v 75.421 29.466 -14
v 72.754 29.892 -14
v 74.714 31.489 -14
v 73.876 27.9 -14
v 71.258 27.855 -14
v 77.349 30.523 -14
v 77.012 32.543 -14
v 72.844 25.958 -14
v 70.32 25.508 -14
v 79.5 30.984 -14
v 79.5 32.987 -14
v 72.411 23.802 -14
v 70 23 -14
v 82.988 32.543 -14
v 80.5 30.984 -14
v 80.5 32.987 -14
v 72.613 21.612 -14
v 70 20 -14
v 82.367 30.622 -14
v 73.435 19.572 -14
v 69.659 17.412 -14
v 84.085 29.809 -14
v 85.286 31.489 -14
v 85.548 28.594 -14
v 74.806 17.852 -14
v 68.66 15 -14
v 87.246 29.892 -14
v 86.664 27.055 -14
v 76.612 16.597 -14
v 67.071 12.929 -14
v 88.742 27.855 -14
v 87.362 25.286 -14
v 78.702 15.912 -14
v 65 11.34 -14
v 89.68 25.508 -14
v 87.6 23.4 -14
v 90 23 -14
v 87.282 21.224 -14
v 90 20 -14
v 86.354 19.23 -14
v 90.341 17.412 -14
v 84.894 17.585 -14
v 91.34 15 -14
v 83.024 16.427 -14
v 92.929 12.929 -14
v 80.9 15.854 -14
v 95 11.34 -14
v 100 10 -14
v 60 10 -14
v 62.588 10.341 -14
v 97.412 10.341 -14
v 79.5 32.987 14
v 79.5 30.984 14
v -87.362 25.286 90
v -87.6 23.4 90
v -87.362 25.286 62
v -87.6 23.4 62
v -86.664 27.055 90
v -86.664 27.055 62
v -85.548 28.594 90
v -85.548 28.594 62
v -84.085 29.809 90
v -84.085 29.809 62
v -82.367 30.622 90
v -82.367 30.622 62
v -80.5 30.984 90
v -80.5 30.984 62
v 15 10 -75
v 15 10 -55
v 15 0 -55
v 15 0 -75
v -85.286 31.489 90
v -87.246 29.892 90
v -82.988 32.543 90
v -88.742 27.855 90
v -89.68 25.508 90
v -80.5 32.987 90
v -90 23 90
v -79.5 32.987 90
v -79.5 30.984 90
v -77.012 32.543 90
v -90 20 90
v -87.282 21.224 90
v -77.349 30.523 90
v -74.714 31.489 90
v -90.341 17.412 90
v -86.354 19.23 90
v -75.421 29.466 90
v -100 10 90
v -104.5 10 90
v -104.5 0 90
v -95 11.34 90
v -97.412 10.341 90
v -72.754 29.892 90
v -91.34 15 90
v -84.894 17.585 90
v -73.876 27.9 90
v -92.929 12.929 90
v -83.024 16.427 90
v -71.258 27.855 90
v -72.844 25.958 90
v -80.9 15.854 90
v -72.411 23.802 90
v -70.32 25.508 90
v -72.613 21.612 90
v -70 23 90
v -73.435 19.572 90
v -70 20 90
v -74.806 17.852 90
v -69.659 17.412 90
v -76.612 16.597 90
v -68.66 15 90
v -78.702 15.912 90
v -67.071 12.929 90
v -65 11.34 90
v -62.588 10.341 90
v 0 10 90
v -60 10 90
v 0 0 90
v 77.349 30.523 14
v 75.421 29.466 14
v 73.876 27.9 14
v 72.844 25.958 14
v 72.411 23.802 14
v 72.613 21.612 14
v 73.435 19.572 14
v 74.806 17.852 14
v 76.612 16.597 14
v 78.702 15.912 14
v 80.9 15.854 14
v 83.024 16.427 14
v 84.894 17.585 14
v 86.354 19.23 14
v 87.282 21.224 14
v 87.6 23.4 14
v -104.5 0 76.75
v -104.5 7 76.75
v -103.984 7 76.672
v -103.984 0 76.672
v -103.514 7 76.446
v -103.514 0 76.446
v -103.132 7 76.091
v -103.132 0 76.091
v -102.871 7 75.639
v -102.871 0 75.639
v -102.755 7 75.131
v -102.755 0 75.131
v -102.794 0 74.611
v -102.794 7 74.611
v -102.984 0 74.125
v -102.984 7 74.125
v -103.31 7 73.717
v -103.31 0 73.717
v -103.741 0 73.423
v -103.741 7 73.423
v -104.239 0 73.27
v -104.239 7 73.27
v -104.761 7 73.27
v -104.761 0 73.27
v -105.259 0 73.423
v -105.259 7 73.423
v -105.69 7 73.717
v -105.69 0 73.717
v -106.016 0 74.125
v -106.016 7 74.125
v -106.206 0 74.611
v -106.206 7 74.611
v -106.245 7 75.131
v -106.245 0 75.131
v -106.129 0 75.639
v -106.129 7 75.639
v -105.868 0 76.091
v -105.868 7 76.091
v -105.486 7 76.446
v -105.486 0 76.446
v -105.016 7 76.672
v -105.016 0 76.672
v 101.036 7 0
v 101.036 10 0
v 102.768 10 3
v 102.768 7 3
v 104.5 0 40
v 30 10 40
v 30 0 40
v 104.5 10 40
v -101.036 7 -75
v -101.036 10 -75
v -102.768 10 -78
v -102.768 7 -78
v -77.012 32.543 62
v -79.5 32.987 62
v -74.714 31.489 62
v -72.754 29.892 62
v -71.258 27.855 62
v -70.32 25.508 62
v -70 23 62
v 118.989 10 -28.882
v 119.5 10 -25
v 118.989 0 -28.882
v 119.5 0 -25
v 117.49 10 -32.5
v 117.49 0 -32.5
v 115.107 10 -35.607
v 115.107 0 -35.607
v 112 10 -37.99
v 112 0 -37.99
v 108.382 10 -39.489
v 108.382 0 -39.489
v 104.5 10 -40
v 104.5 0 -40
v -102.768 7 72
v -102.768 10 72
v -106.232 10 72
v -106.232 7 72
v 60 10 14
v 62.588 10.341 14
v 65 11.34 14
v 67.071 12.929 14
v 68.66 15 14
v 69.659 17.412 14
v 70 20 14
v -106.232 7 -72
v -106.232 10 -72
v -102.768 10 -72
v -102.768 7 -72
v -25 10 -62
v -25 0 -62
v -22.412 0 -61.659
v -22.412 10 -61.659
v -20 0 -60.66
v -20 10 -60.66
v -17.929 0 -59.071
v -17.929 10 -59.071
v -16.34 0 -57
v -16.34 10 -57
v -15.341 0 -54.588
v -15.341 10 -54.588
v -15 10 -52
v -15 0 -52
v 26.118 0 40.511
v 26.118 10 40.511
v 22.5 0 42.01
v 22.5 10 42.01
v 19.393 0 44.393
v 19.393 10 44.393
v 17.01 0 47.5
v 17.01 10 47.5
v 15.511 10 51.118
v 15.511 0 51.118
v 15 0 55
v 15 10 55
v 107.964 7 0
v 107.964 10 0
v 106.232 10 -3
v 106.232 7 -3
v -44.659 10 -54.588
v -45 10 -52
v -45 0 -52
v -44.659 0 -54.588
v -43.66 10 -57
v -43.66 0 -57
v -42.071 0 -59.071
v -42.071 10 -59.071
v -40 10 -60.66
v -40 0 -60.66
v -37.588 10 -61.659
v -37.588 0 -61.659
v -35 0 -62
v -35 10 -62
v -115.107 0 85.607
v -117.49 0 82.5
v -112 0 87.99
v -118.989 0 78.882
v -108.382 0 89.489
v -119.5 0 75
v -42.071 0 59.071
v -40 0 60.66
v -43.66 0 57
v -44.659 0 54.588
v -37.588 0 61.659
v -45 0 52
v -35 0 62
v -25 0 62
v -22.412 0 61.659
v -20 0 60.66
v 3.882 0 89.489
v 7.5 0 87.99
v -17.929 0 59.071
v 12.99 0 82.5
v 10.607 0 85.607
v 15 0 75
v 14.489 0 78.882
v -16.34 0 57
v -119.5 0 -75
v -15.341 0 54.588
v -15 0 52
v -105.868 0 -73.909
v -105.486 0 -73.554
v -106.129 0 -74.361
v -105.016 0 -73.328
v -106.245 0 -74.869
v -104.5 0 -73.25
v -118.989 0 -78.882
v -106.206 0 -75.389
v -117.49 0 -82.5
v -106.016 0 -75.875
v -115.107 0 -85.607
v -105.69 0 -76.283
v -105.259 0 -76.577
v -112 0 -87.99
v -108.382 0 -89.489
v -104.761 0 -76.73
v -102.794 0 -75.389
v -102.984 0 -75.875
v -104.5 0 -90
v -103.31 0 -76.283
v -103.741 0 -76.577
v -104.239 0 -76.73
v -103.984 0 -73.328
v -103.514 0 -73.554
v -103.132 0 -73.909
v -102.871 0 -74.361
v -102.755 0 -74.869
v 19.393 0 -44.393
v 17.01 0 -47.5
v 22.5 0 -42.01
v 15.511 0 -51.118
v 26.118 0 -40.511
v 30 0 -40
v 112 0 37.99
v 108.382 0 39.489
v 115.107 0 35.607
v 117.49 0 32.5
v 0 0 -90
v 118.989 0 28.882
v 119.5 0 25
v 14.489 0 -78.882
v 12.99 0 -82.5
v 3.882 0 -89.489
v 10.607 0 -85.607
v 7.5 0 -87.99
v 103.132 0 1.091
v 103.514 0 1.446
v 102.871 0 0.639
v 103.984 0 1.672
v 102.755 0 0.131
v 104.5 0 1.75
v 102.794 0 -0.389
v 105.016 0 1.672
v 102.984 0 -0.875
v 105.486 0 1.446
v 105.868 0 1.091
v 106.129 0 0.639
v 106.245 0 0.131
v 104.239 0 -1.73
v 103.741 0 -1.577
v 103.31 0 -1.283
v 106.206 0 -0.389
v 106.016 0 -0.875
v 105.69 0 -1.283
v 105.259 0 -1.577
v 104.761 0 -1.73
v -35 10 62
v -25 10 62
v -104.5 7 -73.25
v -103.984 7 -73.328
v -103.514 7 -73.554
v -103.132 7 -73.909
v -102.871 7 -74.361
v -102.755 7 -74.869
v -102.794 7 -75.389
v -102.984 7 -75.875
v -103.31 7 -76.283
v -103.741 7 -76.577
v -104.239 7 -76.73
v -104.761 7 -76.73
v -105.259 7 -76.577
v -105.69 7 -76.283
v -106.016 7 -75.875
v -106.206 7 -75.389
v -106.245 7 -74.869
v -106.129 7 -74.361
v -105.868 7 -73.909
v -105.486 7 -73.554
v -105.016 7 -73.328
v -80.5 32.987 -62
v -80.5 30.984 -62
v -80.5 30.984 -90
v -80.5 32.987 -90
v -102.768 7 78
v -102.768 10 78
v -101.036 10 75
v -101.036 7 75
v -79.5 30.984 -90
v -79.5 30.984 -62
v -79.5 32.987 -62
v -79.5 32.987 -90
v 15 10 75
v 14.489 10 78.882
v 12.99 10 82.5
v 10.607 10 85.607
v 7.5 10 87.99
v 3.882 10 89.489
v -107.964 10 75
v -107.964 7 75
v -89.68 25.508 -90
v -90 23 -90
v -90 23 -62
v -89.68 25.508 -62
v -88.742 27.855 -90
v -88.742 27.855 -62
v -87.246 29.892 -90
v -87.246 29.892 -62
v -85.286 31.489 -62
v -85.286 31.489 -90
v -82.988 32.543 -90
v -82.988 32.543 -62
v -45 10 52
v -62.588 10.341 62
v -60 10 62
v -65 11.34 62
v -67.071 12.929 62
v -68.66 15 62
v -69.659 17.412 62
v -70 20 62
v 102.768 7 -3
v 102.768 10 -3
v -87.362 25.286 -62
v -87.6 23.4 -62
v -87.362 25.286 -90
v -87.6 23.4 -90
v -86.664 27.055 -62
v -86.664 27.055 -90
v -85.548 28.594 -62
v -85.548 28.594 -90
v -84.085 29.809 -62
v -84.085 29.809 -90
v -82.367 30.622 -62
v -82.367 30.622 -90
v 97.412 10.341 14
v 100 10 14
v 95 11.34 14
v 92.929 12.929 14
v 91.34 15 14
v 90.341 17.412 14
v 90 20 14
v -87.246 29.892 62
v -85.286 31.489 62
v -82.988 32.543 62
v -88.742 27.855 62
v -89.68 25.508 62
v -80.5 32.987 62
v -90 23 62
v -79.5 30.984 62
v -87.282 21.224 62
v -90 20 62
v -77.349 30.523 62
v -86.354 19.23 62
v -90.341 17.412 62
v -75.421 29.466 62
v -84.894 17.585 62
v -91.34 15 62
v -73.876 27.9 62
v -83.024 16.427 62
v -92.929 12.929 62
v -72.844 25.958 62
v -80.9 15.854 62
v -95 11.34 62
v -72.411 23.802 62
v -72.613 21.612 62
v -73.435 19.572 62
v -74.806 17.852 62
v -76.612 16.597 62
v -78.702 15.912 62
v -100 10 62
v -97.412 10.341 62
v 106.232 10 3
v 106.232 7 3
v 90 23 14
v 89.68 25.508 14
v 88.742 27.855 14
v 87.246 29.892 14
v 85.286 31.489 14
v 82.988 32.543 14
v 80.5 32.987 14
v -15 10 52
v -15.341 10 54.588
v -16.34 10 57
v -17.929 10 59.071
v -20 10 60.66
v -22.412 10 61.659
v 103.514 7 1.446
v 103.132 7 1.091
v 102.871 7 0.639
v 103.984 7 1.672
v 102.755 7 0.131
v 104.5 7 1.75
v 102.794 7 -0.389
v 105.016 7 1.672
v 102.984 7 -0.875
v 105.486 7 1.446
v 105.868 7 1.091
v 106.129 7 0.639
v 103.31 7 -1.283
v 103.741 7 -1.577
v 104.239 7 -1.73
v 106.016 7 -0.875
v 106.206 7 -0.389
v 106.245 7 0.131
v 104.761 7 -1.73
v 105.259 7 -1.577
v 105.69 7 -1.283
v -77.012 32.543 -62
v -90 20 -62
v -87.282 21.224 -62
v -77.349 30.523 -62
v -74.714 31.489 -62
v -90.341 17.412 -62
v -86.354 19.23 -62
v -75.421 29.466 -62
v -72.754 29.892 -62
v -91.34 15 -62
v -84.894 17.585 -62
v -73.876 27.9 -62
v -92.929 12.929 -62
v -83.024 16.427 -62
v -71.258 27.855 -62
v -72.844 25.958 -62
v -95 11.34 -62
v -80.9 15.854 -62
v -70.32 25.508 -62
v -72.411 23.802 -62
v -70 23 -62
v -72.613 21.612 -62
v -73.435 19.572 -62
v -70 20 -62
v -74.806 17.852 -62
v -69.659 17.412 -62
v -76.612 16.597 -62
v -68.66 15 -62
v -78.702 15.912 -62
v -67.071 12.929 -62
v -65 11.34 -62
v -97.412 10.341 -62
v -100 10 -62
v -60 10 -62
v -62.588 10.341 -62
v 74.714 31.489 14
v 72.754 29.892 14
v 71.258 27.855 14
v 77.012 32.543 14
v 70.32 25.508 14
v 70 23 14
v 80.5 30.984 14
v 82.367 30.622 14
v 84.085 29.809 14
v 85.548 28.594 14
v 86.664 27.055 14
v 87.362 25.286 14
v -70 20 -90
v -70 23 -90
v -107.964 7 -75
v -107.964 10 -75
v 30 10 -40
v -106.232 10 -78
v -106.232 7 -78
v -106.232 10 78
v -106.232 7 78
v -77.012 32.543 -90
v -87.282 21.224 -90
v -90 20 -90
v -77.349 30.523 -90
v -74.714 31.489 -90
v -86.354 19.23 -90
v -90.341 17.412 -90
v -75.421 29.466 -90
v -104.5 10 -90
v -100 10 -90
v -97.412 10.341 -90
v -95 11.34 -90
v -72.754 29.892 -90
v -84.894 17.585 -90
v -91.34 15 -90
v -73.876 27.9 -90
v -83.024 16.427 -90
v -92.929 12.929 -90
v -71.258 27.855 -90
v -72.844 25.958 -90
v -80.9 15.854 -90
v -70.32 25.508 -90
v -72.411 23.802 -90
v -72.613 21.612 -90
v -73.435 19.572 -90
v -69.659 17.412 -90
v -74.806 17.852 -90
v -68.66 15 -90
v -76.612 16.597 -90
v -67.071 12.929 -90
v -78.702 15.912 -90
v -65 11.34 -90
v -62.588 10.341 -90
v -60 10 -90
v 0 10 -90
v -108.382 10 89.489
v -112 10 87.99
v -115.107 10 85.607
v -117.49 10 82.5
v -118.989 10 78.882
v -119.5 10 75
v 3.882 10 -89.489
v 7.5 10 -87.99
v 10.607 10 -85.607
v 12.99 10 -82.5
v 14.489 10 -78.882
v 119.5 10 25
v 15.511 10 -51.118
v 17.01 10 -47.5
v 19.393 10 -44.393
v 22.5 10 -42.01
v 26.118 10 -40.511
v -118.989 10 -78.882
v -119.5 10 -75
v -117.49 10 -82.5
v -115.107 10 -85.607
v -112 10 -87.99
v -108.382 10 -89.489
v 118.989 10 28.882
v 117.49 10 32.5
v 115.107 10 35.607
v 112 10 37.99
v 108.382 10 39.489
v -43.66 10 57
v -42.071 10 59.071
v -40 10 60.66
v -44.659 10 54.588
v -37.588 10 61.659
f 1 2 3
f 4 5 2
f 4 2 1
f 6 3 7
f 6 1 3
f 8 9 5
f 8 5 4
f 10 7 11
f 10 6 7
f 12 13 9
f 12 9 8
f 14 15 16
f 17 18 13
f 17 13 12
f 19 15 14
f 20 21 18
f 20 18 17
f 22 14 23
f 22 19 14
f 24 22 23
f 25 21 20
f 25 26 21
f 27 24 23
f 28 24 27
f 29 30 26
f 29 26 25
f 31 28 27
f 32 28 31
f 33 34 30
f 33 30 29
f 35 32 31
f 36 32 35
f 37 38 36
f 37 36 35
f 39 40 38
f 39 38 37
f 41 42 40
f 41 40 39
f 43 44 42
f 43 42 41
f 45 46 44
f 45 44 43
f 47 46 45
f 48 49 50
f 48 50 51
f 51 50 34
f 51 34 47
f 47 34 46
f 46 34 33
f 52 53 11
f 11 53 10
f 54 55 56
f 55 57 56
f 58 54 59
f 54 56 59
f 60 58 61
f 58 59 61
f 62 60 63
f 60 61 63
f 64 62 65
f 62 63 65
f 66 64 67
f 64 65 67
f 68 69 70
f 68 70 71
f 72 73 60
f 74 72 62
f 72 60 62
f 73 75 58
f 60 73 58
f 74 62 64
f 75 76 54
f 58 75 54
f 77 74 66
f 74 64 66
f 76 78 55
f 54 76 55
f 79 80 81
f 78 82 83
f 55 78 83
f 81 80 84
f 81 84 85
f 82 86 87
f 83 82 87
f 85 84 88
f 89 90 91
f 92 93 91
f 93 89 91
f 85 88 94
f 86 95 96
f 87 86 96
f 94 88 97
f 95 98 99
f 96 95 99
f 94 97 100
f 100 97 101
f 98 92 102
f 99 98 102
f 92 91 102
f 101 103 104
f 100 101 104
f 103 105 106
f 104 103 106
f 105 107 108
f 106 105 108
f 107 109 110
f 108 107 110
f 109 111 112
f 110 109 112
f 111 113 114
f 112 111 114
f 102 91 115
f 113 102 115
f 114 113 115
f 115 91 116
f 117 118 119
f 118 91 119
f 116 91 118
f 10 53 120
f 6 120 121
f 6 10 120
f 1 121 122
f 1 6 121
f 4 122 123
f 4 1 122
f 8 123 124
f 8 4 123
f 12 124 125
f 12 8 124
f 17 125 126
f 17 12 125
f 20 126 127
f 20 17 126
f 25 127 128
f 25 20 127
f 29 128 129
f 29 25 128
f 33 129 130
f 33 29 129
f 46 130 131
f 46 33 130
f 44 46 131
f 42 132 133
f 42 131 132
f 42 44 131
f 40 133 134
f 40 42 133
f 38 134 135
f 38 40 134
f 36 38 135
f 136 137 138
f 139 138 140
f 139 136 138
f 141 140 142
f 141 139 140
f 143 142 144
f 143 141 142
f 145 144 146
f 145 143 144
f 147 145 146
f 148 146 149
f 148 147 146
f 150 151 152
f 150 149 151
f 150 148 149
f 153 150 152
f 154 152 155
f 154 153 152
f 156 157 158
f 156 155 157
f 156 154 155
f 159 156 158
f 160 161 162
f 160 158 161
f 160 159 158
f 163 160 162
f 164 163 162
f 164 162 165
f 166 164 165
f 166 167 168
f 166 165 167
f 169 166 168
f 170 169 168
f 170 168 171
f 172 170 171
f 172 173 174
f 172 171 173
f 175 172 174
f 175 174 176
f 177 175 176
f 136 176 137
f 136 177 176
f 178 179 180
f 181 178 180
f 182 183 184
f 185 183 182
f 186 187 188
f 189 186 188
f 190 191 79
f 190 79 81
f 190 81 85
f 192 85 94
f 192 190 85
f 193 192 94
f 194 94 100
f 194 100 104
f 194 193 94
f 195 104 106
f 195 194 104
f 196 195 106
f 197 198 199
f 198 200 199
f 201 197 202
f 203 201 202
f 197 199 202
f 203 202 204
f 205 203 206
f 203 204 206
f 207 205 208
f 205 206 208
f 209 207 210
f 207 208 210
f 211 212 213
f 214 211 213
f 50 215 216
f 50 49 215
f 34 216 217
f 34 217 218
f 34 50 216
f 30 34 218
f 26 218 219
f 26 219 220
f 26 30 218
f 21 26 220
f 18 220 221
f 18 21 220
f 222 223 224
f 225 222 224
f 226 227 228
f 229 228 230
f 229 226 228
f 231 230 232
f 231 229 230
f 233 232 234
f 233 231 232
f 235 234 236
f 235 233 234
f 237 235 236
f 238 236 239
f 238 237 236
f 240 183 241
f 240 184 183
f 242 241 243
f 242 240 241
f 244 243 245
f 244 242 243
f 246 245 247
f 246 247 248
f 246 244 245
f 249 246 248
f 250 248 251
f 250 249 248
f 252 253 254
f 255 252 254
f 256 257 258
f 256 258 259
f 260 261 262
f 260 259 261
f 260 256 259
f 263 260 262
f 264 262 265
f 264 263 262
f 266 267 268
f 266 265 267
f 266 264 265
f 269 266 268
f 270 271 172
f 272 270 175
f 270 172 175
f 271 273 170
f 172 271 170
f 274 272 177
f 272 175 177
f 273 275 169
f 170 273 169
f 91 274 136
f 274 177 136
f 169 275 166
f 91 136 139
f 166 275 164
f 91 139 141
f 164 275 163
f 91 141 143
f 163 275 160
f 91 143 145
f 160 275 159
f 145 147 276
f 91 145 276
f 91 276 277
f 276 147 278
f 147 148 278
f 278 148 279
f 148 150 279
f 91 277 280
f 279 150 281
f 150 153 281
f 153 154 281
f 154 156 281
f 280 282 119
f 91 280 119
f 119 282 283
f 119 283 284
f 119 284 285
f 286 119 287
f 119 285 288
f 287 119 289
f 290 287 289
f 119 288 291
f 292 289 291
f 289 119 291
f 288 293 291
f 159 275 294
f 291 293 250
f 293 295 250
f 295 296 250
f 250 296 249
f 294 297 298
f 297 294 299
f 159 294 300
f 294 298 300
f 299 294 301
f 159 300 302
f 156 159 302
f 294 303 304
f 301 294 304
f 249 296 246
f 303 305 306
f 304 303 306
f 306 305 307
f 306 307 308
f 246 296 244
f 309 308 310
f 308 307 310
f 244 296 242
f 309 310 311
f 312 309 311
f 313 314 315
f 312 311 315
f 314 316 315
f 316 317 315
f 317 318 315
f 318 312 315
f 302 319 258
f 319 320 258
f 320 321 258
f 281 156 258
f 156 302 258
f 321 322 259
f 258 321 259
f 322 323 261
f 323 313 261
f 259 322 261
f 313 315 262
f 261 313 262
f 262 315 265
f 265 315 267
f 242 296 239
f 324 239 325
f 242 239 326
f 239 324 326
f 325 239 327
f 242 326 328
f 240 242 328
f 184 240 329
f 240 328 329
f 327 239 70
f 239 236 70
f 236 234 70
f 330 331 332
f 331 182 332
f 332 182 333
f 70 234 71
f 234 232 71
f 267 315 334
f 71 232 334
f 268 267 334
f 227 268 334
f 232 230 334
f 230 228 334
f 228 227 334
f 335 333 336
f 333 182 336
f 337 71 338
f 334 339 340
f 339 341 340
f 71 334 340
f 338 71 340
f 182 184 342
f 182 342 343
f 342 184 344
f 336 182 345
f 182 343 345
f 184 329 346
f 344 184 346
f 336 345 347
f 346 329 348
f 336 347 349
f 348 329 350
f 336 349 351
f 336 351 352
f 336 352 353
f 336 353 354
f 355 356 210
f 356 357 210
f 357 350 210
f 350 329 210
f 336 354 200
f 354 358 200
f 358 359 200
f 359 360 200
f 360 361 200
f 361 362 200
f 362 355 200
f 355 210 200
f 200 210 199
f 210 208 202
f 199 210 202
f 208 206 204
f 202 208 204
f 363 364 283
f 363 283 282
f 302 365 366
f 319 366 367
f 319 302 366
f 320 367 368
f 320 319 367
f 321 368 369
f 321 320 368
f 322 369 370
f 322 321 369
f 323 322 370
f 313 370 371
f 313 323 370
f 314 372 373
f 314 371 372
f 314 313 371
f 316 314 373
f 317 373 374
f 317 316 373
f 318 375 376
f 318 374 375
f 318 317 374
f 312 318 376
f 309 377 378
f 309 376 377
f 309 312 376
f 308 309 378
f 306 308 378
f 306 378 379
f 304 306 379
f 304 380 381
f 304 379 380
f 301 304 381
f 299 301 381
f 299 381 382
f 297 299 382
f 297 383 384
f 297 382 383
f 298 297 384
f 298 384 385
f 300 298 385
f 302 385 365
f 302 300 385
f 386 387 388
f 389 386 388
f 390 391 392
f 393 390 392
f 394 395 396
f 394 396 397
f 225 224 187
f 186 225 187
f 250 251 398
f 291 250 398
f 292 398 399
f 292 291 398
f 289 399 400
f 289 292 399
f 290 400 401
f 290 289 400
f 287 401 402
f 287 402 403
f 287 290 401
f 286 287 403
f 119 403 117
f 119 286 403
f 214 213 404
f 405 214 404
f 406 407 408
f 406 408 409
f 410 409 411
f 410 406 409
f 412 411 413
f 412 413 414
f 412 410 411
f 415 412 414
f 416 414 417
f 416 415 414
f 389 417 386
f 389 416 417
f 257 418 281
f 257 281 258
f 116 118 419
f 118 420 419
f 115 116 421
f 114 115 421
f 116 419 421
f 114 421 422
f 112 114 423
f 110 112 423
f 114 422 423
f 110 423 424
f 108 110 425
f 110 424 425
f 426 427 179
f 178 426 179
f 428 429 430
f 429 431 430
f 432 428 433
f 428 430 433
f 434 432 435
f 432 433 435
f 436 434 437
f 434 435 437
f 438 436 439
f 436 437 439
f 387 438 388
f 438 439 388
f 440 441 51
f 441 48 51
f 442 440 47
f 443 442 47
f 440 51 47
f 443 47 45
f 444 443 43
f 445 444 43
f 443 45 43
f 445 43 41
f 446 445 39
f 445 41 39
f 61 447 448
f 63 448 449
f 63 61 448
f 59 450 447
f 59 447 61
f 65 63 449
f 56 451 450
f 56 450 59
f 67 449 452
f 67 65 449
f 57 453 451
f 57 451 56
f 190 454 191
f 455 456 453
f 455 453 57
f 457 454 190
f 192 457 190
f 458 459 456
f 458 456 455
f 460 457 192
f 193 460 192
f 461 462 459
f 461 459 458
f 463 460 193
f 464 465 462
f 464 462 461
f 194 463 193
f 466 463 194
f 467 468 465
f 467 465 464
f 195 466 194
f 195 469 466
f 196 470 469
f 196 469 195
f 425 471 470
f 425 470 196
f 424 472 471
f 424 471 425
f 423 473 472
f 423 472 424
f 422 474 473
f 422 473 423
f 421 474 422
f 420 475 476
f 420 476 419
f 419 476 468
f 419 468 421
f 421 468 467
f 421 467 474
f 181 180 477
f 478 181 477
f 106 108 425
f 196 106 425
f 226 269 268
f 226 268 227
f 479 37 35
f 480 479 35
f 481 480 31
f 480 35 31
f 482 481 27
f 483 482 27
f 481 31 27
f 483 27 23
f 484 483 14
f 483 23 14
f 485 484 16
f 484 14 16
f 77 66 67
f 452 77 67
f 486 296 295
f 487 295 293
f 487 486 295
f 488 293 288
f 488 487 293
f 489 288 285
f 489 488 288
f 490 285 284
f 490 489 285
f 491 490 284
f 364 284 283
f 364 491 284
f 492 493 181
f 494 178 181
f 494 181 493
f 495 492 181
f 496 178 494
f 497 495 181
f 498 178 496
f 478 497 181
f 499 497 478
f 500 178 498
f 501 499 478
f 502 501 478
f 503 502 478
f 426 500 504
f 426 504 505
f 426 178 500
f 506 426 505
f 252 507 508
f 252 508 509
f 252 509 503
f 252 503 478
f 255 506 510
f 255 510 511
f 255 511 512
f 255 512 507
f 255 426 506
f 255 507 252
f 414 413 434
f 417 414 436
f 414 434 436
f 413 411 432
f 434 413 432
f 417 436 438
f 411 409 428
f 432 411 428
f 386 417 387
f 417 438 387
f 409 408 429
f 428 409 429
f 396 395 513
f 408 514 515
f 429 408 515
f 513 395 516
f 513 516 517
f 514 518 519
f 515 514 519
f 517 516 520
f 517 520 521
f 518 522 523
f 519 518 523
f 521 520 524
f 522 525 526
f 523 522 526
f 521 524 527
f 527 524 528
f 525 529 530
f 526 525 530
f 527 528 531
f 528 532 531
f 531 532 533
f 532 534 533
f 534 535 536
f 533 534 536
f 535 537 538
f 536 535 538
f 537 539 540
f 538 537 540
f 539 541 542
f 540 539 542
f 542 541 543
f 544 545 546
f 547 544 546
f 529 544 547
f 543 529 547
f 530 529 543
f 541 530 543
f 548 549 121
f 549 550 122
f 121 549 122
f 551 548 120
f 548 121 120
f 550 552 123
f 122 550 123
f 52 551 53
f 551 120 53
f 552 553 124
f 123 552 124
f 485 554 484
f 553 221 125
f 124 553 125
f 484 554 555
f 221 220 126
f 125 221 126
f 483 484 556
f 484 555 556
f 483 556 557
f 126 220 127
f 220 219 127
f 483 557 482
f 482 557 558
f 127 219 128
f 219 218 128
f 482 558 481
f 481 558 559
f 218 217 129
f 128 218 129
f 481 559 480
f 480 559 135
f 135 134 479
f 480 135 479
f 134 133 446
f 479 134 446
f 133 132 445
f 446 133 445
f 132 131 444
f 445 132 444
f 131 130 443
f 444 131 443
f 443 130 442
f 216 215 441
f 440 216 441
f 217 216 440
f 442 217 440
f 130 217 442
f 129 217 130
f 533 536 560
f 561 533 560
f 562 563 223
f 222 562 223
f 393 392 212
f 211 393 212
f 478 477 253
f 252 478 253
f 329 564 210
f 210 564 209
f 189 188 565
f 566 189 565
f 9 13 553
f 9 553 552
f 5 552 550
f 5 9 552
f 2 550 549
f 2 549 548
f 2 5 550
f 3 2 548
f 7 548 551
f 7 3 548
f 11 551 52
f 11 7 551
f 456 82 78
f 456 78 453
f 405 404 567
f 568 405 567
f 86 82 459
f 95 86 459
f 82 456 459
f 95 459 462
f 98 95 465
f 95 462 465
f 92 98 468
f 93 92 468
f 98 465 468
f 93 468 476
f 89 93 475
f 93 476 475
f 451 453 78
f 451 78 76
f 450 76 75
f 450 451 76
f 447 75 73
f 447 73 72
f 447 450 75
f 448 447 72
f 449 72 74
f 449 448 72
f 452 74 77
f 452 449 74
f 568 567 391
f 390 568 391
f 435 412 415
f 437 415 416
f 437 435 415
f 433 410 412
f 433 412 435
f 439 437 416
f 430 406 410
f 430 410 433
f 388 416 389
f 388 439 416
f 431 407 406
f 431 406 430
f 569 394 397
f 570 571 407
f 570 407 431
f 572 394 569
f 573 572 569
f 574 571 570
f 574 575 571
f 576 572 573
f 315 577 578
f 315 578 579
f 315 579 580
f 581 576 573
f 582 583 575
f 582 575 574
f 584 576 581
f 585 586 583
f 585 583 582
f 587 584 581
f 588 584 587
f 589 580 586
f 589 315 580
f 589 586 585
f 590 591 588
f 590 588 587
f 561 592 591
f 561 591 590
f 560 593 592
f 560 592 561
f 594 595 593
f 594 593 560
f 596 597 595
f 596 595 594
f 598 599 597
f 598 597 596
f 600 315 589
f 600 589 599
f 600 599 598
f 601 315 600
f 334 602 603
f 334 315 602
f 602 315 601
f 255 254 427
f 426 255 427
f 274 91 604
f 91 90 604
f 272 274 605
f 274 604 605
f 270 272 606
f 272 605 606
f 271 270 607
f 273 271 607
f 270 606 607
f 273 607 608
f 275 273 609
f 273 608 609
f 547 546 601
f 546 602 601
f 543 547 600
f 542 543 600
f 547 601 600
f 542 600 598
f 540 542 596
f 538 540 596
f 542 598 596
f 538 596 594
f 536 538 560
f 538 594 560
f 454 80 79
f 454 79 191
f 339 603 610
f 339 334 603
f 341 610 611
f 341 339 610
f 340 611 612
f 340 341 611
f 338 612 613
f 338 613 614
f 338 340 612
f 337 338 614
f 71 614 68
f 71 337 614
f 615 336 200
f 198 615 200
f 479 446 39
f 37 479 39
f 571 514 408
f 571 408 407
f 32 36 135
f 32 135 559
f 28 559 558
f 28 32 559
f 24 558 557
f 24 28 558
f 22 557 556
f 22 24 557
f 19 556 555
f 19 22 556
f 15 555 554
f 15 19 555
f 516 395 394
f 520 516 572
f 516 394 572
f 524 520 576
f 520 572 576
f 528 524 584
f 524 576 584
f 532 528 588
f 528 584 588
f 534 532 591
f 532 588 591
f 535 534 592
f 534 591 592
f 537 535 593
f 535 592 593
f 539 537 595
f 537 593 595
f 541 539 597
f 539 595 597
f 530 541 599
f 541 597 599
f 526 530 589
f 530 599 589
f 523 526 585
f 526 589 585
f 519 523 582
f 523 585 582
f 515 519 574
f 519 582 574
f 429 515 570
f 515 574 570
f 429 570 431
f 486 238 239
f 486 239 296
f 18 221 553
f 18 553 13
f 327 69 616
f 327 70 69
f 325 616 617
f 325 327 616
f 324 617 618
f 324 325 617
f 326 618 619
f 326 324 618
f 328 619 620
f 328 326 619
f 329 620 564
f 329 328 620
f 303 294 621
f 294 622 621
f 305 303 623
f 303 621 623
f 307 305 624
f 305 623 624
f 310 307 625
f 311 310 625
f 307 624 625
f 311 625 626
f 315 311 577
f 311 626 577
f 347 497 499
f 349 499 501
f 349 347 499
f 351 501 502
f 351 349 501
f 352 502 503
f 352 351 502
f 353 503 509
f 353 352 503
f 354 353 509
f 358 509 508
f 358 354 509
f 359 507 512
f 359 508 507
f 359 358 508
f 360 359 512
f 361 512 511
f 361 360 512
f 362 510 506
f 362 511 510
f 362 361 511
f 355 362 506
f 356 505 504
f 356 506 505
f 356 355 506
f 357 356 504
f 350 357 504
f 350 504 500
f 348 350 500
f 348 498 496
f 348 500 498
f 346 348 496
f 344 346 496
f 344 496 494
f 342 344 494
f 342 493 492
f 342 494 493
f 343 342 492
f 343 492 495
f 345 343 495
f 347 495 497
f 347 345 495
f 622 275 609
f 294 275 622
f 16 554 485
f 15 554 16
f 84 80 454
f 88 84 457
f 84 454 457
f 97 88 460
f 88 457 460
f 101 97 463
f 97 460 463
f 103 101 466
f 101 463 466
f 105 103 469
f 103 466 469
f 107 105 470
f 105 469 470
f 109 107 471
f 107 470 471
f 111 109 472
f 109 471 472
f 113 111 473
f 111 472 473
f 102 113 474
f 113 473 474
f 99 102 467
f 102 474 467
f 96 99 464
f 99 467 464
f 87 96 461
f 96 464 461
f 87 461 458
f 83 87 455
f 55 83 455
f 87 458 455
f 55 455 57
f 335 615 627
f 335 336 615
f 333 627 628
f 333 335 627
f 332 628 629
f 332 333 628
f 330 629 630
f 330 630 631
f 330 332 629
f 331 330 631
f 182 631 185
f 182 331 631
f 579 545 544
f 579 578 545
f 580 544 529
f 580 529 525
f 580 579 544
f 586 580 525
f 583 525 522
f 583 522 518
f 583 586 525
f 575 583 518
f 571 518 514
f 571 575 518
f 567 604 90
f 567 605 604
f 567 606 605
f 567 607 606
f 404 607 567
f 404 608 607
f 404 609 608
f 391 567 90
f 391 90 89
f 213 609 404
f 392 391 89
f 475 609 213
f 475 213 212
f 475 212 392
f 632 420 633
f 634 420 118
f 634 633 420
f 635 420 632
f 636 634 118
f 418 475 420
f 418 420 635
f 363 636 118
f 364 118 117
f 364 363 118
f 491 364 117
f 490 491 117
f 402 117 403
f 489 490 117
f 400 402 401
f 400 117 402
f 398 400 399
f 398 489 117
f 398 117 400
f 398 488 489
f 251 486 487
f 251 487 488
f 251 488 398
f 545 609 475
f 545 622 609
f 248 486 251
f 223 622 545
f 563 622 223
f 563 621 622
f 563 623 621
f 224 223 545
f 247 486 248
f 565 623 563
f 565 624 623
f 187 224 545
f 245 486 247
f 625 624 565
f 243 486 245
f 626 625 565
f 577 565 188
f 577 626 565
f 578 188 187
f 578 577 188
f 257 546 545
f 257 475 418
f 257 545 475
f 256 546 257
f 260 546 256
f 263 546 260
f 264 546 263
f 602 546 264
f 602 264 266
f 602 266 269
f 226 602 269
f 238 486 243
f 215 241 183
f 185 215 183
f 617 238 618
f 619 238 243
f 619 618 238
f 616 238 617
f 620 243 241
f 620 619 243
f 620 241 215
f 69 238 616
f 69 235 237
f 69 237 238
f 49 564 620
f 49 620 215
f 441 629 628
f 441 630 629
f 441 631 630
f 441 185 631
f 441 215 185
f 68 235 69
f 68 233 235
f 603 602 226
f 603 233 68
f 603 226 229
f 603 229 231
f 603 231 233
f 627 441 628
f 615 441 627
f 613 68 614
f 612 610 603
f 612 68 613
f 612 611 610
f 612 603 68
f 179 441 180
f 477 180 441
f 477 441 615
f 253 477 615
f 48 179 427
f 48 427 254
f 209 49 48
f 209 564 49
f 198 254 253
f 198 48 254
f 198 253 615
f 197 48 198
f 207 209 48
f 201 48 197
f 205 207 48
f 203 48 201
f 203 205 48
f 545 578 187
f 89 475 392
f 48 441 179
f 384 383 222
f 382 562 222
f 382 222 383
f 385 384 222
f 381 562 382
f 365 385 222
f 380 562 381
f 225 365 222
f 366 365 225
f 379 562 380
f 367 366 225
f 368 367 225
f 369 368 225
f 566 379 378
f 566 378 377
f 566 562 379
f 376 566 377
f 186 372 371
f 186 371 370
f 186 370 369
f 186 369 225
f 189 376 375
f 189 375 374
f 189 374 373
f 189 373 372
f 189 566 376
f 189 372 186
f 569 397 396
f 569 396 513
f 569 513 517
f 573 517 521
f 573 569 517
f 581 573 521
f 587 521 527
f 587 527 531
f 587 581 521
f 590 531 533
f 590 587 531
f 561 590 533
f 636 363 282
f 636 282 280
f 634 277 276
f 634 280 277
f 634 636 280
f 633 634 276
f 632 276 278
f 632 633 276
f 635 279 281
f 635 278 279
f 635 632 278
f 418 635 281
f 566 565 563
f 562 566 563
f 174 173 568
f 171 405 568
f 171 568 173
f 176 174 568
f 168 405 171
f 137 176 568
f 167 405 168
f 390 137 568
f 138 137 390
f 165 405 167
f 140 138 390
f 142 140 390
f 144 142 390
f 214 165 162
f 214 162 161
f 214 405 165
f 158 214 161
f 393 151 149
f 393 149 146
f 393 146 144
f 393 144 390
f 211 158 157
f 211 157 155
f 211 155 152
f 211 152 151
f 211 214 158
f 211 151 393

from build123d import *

# Parameters (mm, degrees)
SKETCH1_W               = 239
SKETCH1_H               = 180
SKETCH1_R               = 1.75
BOSS_EXTRUDE1_DEPTH     = 10
SKETCH2_W               = 20
SKETCH2_H               = 28
BOSS_EXTRUDE2_DEPTH     = 23
SKETCH3_R               = 7.6
CUT_EXTRUDE1_DEPTH      = 219.561776164
FILLET1_R               = 10
FILLET2_R               = 10
CUT_EXTRUDE2_DEPTH      = 20
SKETCH5_W               = 104.5
SKETCH5_H               = 50
CUT_EXTRUDE3_DEPTH      = 20
FILLET3_R               = 15
FILLET4_R               = 15
CUT_EXTRUDE4_DEPTH      = 3
SKETCH7_W               = 1
SKETCH7_H               = 35.181003967
SKETCH7_H_2             = 30.639156463
SKETCH7_H_3             = 31.227118238
CUT_EXTRUDE_THIN1_DEPTH = 21


with BuildPart() as part:
    # Sketch1 → Boss-Extrude1 (new body)
    with BuildSketch(Plane(origin=(0, 0, 0), x_dir=(1, 0, 0), z_dir=(0, 1, 0))):
        Rectangle(SKETCH1_W, SKETCH1_H)
        with Locations(Location((104.5, 0, 0), (0, 0, 270))):
            Circle(SKETCH1_R, mode=Mode.SUBTRACT)
        with Locations(Location((-104.5, 75, 0), (0, 0, 270))):
            Circle(SKETCH1_R, mode=Mode.SUBTRACT)
        with Locations(Location((-104.5, -75, 0), (0, 0, 270))):
            Circle(SKETCH1_R, mode=Mode.SUBTRACT)
    extrude(amount=BOSS_EXTRUDE1_DEPTH)

    # Sketch2 → Boss-Extrude2 (add)
    with BuildSketch(Plane(origin=(0, 10, 0), x_dir=(1, 0, 0), z_dir=(0, 1, 0))):
        with Locations((-80, 76)):
            Rectangle(SKETCH2_W, SKETCH2_H)
        with Locations((-80, -76)):
            Rectangle(SKETCH2_W, SKETCH2_H)
        with Locations((80, 0)):
            Rectangle(SKETCH2_W, SKETCH2_H)
    extrude(amount=BOSS_EXTRUDE2_DEPTH)

    # Sketch3 → Cut-Extrude1 (cut, symmetric)
    with BuildSketch(Plane(origin=(0, 0, -90), x_dir=(-1, 0, 0), z_dir=(0, 0, -1))):
        with Locations((80, 23.4)):
            Circle(SKETCH3_R)
    cut_extrude1 = extrude(amount=CUT_EXTRUDE1_DEPTH, both=True, mode=Mode.SUBTRACT)

    # Fillet1
    fillet1_edges = [part.edges().sort_by_distance(p)[0] for p in [
        (90, 33, 0),
        (70, 33, 0),
        (-90, 33, 76),
        (-70, 33, 76),
        (-70, 33, -76),
        (-90, 33, -76),
    ]]
    fillet(fillet1_edges, radius=FILLET1_R - 0.0001)  # a hair under: the kernel refuses the full size

    # Mirror1: Cut-Extrude1 across plane
    add(cut_extrude1.mirror(Plane(origin=(0, 0, 0), x_dir=(0, 0, 1), z_dir=(1, 0, 0))), mode=Mode.SUBTRACT)

    # Fillet2
    fillet2_edges = [part.edges().sort_by_distance(p)[0] for p in [
        (-70, 10, -76),
        (-90, 10, -76),
        (-70, 10, 76),
        (-90, 10, 76),
        (70, 10, 0),
        (90, 10, 0),
    ]]
    fillet(fillet2_edges, radius=FILLET2_R)

    # Sketch4 → Cut-Extrude2 (cut)
    with BuildSketch(Plane(origin=(0, 10, 0), x_dir=(1, 0, 0), z_dir=(0, 1, 0))):
        with BuildLine():
            Line((-35, 62), (-25, 62))
            ThreePointArc((-25, 62), (-17.928932188, 59.071067812), (-15, 52))
            Line((-15, 52), (-15, -52))
            ThreePointArc((-15, -52), (-17.928932188, -59.071067812), (-25, -62))
            Line((-25, -62), (-35, -62))
            ThreePointArc((-35, -62), (-42.071067812, -59.071067812), (-45, -52))
            Line((-45, -52), (-45, 52))
            ThreePointArc((-45, 52), (-42.071067812, 59.071067812), (-35, 62))
        make_face()
    extrude(amount=-CUT_EXTRUDE2_DEPTH, mode=Mode.SUBTRACT)

    # Sketch5 → Cut-Extrude3 (cut)
    with BuildSketch(Plane(origin=(0, 10, 0), x_dir=(1, 0, 0), z_dir=(0, 1, 0))):
        with Locations((67.25, 65)):
            Rectangle(SKETCH5_W, SKETCH5_H)
    cut_extrude3 = extrude(amount=-CUT_EXTRUDE3_DEPTH, mode=Mode.SUBTRACT)

    # Fillet3
    fillet3_edges = [part.edges().sort_by_distance(p)[0] for p in [
        (15, 5, -90),
        (119.5, 5, -40),
        (15, 5, -40),
        (-119.5, 5, -90),
    ]]
    fillet(fillet3_edges, radius=FILLET3_R)

    # Mirror2: Cut-Extrude3 across plane
    add(cut_extrude3.mirror(Plane.XY), mode=Mode.SUBTRACT)

    # Fillet4
    fillet4_edges = [part.edges().sort_by_distance(p)[0] for p in [
        (15, 5, 90),
        (119.5, 5, 40),
        (15, 5, 40),
        (-119.5, 5, 90),
    ]]
    fillet(fillet4_edges, radius=FILLET4_R)

    # Sketch6 → Cut-Extrude4 (cut)
    with BuildSketch(Plane(origin=(0, 10, 0), x_dir=(1, 0, 0), z_dir=(0, 1, 0))):
        Polygon((-107.964101615, -75), (-106.232050808, -78), (-102.767949192, -78), (-101.035898385, -75), (-102.767949192, -72), (-106.232050808, -72), align=None)
        Polygon((-107.964101615, 75), (-106.232050808, 72), (-102.767949192, 72), (-101.035898385, 75), (-102.767949192, 78), (-106.232050808, 78), align=None)
        Polygon((107.964101615, 0), (106.232050808, 3), (102.767949192, 3), (101.035898385, 0), (102.767949192, -3), (106.232050808, -3), align=None)
    extrude(amount=-CUT_EXTRUDE4_DEPTH, mode=Mode.SUBTRACT)

    # Sketch7 → Cut-Extrude-Thin1 (cut)
    with BuildSketch(Plane(origin=(0, 25, 0), x_dir=(1, 0, 0), z_dir=(0, 1, 0))):
        with Locations((-80, -79.590501984)):
            Rectangle(SKETCH7_W, SKETCH7_H)
        with Locations((-80, 74.680421768)):
            Rectangle(SKETCH7_W, SKETCH7_H_2)
        with Locations((80, -1.613559119)):
            Rectangle(SKETCH7_W, SKETCH7_H_3)
    extrude(amount=CUT_EXTRUDE_THIN1_DEPTH, mode=Mode.SUBTRACT)


solid = part.part
